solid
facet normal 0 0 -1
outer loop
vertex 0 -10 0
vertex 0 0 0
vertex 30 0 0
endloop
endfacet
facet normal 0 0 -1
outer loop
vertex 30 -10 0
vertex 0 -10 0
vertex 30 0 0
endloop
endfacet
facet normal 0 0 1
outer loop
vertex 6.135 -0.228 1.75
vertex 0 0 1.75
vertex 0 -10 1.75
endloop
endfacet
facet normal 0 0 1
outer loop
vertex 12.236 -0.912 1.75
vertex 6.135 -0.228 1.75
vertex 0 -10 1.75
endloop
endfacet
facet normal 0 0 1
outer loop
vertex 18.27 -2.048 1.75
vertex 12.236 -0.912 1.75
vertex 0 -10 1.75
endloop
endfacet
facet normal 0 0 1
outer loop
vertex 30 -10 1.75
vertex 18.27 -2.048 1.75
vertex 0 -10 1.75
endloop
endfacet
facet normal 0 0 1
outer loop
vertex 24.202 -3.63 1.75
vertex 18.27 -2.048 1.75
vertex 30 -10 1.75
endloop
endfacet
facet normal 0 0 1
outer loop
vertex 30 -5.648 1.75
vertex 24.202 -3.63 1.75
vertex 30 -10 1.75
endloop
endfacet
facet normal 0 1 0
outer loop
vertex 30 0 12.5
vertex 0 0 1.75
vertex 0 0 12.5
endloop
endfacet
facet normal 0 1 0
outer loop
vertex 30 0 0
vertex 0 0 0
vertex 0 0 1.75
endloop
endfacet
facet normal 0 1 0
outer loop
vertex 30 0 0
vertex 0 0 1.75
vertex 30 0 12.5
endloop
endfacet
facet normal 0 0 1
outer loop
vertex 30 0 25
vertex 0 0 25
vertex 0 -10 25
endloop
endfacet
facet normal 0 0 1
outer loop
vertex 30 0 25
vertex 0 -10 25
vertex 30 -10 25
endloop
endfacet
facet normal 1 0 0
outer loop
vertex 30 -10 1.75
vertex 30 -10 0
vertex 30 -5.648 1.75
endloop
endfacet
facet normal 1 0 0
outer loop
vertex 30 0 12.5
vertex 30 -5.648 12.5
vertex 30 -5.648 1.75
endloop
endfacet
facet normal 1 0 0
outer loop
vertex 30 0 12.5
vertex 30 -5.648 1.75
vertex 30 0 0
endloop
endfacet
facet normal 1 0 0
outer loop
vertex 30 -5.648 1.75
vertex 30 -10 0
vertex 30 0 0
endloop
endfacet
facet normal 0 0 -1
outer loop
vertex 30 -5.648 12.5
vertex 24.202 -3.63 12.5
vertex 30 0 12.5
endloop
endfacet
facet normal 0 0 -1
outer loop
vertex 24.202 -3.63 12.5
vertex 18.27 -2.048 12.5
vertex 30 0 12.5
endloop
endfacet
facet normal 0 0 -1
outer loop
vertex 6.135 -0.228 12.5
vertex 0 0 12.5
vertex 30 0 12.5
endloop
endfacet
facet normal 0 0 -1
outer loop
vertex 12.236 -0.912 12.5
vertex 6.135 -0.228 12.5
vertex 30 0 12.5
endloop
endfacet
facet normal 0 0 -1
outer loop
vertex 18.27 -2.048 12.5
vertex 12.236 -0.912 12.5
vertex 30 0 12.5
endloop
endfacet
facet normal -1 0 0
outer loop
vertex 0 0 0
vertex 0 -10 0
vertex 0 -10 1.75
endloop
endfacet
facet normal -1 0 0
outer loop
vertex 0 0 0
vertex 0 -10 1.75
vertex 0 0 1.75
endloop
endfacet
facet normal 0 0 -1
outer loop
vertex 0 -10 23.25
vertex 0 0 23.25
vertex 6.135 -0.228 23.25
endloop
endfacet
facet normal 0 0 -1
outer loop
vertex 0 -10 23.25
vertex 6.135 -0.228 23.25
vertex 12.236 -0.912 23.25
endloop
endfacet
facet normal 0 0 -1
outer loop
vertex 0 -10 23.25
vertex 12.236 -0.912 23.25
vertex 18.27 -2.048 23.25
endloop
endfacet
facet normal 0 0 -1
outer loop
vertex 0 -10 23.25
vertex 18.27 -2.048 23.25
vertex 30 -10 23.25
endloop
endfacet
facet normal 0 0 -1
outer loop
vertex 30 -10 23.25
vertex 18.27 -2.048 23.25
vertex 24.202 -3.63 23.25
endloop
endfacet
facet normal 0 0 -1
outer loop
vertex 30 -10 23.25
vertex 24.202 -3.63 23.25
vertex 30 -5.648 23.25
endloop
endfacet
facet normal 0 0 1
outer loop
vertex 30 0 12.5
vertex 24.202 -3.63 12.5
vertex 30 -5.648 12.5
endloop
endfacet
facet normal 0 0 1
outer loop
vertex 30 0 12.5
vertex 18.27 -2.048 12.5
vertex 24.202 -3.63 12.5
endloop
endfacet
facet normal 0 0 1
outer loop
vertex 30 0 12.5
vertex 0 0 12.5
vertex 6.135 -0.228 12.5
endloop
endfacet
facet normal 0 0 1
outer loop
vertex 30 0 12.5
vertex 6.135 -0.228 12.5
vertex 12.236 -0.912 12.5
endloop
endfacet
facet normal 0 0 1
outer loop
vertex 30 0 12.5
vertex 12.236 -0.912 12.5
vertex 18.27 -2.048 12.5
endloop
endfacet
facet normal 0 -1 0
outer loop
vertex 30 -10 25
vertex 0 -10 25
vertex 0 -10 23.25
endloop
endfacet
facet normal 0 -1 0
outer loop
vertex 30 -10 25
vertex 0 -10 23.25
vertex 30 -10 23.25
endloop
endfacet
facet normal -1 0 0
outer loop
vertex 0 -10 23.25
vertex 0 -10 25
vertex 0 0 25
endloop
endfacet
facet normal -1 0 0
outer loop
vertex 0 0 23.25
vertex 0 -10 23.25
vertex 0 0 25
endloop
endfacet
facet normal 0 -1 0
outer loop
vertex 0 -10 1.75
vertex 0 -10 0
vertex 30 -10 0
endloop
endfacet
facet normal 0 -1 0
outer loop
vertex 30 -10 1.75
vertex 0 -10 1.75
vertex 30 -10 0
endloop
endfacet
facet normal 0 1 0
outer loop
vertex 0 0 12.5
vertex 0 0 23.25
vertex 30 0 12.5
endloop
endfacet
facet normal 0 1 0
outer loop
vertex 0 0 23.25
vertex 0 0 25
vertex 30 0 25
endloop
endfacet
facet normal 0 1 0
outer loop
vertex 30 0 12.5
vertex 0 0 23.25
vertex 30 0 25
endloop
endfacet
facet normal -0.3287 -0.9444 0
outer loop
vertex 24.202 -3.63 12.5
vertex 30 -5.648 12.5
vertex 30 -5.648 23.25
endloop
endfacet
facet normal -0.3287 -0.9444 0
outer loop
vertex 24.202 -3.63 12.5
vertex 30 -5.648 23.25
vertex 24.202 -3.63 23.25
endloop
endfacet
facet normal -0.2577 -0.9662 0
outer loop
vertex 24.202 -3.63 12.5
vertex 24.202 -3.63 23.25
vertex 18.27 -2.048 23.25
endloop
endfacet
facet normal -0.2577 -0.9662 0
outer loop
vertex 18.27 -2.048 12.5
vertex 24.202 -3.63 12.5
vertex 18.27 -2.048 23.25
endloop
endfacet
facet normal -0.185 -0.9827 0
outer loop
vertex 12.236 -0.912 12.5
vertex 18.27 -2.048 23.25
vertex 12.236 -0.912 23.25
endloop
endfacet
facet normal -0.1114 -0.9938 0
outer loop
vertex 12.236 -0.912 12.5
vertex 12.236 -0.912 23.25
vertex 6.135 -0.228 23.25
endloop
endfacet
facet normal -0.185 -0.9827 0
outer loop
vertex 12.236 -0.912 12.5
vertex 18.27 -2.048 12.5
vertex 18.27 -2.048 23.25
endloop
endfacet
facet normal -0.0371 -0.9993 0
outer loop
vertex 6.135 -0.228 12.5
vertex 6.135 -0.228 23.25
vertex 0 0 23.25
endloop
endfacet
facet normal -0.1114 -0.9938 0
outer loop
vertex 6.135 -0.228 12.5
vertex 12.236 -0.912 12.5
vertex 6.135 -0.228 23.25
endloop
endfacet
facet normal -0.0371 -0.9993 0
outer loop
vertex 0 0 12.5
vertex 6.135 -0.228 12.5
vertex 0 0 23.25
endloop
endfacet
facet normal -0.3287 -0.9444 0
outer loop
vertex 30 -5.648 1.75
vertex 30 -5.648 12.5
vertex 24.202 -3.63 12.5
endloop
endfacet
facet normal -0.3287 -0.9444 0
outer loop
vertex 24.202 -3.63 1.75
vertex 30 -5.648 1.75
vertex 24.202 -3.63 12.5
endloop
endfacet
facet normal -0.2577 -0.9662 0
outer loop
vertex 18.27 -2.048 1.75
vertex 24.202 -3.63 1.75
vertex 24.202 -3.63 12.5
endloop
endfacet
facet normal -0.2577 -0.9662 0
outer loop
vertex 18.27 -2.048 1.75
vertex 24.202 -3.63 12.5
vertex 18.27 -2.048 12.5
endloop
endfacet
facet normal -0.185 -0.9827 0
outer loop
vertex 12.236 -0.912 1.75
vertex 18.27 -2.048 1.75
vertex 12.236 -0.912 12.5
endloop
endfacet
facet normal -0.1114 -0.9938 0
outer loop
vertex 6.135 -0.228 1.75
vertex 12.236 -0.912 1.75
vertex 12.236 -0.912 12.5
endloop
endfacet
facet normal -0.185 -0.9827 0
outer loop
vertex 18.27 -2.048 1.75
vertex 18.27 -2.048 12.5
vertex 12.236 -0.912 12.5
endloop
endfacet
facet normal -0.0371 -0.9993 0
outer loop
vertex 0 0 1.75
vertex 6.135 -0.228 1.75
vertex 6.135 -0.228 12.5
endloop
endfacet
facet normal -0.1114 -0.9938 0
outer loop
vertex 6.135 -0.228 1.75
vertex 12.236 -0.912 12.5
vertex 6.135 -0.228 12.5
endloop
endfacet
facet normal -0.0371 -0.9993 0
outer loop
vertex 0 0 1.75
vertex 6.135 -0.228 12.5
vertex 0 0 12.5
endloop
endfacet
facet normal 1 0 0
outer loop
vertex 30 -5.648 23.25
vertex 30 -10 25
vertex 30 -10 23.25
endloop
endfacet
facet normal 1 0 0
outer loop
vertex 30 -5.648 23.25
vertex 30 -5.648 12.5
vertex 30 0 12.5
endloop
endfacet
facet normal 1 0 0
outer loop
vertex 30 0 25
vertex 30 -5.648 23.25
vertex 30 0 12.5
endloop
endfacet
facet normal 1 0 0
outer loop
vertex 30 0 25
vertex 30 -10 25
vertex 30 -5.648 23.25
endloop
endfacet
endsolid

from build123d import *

# Parameters (mm, degrees)
F1_W     = 30
F1_H     = 10
F2_DEPTH = 12.5
F4_DEPTH = 10.75


# Not quite as in the source:
# - a feature names something its author has since deleted; it is built from what else it names


with BuildPart() as f2:
    # F1 (on Top) → F2 (new body)
    with BuildSketch(Plane.XY):
        with Locations((15, -5)):
            Rectangle(F1_W, F1_H)
    extrude(amount=F2_DEPTH)

    # F3 (on face) → F4 (cut)
    with BuildSketch(Plane.XY.offset(12.5)):
        with BuildLine():
            Line((30, -10), (30, -5.6478692553))
            ThreePointArc((30, -5.6478692553), (15.2635057173, -1.4242613773), (0, 0))
            Line((0, 0), (0, -10))
            Line((0, -10), (30, -10))
        make_face()
    extrude(amount=-F4_DEPTH, mode=Mode.SUBTRACT)


with BuildPart() as f5_1:
    # F5: instance of F2
    add(f2.part.mirror(Plane(origin=(22.5523055591, -1.6839325629, 12.5), x_dir=(1, 0, 0), z_dir=(0, 0, 1))))


solid = Compound([f2.part, f5_1.part])
